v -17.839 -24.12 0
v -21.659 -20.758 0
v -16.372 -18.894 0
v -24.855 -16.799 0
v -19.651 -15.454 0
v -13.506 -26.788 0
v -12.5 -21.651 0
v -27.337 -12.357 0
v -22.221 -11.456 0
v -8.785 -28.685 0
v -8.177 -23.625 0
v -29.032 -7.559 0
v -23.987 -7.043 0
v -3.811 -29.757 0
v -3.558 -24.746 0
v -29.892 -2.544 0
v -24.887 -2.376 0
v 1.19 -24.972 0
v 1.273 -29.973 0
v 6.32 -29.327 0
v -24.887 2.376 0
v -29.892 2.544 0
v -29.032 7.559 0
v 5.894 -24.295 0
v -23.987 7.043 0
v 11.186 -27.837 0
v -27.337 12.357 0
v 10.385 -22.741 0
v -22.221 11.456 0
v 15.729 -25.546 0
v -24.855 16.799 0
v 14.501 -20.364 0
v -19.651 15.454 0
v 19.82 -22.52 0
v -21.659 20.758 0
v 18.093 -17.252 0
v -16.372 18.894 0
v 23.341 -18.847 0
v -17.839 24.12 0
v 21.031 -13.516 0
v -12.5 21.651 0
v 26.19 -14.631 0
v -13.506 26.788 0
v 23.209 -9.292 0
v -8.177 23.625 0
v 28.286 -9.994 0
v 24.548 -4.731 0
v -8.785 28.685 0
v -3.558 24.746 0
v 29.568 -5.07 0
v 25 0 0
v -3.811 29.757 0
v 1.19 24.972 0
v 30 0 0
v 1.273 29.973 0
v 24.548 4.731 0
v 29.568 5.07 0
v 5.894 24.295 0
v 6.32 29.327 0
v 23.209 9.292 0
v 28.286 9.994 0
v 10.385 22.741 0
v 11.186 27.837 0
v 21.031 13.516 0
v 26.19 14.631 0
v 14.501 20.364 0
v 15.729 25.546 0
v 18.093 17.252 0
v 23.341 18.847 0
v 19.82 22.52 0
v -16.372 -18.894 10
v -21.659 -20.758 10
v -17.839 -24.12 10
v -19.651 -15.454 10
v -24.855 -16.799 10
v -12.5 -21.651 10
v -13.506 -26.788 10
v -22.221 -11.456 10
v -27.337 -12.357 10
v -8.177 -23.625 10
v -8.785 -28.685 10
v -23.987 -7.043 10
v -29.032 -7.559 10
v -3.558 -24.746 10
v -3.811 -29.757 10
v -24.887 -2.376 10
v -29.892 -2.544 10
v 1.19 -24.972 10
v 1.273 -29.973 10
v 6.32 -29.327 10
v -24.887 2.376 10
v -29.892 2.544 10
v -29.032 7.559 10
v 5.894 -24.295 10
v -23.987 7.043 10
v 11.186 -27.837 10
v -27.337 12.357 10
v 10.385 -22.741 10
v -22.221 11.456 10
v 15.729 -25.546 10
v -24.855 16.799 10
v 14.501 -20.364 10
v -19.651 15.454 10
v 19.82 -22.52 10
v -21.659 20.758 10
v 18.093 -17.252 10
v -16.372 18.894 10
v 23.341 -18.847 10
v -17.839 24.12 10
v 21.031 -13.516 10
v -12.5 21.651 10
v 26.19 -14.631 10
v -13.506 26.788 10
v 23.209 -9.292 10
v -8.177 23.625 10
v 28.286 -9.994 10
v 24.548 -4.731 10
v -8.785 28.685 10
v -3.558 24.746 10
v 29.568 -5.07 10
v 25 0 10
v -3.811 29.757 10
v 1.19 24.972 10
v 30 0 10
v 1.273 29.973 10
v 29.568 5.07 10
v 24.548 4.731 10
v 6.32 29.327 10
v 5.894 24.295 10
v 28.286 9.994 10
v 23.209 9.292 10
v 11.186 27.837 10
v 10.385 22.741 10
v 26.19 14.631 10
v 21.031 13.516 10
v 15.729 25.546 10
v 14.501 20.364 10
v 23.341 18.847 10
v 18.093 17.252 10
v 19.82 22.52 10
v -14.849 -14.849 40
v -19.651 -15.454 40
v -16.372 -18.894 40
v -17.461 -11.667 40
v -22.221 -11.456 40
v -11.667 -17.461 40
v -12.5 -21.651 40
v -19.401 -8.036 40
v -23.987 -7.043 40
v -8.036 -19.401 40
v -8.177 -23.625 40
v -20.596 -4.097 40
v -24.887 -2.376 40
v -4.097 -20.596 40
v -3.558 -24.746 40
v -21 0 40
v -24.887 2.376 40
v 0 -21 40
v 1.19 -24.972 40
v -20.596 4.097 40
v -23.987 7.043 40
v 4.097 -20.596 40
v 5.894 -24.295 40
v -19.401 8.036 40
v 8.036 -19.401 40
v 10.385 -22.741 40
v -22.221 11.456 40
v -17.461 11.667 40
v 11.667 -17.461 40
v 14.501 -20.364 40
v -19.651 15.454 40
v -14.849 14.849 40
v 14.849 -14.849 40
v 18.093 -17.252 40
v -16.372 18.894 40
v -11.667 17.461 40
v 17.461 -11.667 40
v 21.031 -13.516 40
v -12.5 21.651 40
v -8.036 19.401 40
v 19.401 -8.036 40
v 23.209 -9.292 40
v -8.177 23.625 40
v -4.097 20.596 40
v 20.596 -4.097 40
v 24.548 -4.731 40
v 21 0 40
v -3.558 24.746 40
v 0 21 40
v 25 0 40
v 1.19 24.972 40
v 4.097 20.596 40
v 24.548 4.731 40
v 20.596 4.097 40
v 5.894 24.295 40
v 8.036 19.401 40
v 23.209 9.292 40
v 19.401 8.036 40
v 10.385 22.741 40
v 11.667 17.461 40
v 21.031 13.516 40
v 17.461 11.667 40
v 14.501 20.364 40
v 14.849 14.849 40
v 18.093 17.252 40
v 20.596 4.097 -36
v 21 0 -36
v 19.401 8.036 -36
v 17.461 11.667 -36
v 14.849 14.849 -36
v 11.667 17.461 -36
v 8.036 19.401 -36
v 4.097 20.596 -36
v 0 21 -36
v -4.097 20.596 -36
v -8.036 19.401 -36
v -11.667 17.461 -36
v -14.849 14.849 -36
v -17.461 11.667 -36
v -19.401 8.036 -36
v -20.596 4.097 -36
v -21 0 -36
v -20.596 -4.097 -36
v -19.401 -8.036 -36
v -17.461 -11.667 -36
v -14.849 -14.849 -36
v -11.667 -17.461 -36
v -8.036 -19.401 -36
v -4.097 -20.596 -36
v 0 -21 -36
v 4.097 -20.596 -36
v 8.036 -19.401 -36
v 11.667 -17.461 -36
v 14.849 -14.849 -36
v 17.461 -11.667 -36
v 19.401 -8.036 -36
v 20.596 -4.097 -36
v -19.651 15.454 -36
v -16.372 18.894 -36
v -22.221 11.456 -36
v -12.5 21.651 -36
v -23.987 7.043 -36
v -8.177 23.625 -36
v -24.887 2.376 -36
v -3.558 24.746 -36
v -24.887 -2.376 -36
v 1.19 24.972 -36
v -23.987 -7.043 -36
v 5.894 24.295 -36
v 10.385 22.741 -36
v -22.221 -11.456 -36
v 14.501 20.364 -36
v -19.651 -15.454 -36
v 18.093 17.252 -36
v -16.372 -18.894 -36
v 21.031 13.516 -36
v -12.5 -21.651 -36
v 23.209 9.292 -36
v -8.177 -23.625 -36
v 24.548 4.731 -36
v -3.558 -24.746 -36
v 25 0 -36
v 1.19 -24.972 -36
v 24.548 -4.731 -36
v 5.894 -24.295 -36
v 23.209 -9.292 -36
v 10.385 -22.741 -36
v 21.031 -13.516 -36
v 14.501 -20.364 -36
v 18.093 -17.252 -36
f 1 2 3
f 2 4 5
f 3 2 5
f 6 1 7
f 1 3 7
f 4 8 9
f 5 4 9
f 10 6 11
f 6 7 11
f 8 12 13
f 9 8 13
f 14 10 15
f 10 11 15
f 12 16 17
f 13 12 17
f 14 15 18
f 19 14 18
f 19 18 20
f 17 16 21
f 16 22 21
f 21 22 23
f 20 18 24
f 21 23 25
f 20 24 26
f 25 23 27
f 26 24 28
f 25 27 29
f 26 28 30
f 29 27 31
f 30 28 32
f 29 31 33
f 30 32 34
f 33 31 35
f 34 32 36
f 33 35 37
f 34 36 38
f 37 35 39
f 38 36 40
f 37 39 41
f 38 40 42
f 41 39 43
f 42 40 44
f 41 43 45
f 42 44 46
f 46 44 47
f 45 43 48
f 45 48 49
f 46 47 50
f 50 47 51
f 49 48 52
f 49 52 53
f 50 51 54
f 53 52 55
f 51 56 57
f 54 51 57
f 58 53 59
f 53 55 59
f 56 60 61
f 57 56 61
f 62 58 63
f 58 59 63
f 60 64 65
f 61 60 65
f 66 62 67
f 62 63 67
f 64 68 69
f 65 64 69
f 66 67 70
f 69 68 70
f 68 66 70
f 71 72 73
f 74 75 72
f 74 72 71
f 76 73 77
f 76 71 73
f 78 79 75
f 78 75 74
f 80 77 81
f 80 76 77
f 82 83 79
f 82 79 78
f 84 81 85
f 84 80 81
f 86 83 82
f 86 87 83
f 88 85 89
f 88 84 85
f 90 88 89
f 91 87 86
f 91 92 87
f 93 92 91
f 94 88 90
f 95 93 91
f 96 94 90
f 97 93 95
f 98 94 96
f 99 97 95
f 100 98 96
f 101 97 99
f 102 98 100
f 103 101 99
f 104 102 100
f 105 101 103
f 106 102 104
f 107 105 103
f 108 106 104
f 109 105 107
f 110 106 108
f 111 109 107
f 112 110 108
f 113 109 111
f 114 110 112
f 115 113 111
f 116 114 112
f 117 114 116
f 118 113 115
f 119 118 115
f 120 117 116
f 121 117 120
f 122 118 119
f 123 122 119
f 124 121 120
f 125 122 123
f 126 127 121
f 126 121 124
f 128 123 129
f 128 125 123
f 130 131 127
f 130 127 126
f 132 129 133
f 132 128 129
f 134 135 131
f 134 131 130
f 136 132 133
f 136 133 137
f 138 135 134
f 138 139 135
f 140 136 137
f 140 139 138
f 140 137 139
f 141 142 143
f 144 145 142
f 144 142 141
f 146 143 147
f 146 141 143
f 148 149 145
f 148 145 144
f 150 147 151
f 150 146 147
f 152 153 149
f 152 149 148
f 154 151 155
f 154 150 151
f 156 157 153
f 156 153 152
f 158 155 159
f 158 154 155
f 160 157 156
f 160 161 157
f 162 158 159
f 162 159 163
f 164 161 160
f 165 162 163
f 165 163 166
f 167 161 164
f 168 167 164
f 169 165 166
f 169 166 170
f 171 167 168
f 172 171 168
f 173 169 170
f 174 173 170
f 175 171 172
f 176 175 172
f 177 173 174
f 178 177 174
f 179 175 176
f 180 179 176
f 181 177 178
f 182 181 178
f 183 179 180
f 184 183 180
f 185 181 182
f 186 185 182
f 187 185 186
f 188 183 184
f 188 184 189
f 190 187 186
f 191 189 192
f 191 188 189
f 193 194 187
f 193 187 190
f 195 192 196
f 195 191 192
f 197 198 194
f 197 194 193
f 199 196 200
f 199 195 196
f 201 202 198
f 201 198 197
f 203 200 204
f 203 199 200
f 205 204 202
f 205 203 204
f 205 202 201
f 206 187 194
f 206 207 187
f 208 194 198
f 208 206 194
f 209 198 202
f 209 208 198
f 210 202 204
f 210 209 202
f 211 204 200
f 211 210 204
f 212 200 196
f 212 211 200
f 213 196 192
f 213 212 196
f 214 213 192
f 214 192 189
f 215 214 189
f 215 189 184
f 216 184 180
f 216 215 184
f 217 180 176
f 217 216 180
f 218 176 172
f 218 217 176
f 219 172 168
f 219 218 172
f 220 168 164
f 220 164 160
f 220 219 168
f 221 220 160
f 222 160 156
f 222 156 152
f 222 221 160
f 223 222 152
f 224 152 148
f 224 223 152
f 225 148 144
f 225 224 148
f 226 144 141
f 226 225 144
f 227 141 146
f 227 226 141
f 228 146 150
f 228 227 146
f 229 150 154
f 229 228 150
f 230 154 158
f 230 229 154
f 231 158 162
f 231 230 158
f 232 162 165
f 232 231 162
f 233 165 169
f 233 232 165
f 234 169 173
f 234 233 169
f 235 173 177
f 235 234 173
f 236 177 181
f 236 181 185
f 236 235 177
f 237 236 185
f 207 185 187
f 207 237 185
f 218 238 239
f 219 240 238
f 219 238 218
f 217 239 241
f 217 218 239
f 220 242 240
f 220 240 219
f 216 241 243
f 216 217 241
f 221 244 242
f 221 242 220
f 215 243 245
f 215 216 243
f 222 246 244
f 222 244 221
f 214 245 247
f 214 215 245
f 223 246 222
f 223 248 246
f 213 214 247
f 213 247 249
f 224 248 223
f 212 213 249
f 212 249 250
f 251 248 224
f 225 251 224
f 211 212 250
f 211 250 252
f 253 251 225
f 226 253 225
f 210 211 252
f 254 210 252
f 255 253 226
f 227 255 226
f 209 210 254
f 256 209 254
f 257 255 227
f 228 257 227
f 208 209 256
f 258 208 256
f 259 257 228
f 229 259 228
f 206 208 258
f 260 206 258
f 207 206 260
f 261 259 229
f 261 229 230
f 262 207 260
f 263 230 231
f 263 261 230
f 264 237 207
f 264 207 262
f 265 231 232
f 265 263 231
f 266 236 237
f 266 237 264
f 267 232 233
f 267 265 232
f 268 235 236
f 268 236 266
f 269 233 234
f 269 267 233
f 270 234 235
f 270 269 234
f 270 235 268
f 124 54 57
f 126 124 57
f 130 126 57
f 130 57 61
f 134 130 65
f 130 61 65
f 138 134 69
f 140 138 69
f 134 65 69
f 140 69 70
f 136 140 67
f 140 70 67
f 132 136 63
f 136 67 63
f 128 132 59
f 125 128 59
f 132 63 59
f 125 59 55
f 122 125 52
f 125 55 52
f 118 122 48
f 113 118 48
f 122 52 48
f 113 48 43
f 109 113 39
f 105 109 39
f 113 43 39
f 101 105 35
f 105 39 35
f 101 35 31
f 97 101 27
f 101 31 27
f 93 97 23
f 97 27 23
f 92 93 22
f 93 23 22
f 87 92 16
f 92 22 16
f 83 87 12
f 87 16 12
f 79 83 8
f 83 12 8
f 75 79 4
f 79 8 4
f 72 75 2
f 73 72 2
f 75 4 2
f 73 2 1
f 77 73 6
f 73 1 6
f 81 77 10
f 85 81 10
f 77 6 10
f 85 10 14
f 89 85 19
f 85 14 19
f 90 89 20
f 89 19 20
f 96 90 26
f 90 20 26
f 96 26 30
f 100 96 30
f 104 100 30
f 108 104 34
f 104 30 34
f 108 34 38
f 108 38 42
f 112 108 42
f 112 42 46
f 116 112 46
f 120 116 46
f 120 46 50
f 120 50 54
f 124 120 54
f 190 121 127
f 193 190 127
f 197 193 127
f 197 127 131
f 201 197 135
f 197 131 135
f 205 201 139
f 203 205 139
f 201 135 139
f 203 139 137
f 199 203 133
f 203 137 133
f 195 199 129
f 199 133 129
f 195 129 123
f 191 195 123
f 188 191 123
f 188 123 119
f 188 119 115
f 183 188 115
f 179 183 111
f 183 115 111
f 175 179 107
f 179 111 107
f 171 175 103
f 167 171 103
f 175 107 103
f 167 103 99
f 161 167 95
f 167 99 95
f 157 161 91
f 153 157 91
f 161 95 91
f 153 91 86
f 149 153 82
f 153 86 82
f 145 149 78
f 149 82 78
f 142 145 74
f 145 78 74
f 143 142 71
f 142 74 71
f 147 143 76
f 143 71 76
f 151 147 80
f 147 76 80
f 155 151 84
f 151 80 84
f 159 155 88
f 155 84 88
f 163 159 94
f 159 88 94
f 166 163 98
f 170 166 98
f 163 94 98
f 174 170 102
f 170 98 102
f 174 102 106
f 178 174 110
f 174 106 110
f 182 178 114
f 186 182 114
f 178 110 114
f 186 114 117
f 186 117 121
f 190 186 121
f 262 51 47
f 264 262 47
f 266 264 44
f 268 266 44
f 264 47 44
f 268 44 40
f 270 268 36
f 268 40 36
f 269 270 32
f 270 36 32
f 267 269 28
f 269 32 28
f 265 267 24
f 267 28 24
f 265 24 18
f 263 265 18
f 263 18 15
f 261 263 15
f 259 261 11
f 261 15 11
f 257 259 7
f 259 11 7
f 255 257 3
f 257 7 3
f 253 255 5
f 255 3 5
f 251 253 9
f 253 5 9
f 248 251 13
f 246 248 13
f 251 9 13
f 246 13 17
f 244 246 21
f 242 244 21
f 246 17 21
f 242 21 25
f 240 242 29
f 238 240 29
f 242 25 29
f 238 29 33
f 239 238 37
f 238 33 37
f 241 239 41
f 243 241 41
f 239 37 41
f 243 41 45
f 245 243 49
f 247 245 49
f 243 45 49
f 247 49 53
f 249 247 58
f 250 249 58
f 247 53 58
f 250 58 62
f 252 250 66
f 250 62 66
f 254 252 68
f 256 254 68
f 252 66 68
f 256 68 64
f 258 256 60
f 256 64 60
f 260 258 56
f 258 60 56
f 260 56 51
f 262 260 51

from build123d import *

# Parameters (mm, degrees)
SKETCH_R      = 30
SKETCH_R_2    = 21
PAD_DEPTH     = 10
SKETCH001_R   = 25
SKETCH001_R_2 = 21
PAD001_DEPTH  = 36
SKETCH002_R   = 25
SKETCH002_R_2 = 21
PAD002_DEPTH  = 30


with BuildPart() as part:
    # Sketch → Pad (new body)
    with BuildSketch(Plane.XY):
        Circle(SKETCH_R)
        Circle(SKETCH_R_2, mode=Mode.SUBTRACT)
    extrude(amount=PAD_DEPTH)

    # Sketch001 (on Face3 of Pad) → Pad001 (join)
    with BuildSketch(Plane(origin=(0, 0, 0), x_dir=(1, 0, 0), z_dir=(0, 0, -1))):
        Circle(SKETCH001_R)
        Circle(SKETCH001_R_2, mode=Mode.SUBTRACT)
    extrude(amount=PAD001_DEPTH)

    # Sketch002 (on Face3 of Pad001) → Pad002 (join)
    with BuildSketch(Plane.XY.offset(10)):
        Circle(SKETCH002_R)
        Circle(SKETCH002_R_2, mode=Mode.SUBTRACT)
    extrude(amount=PAD002_DEPTH)


solid = part.part
